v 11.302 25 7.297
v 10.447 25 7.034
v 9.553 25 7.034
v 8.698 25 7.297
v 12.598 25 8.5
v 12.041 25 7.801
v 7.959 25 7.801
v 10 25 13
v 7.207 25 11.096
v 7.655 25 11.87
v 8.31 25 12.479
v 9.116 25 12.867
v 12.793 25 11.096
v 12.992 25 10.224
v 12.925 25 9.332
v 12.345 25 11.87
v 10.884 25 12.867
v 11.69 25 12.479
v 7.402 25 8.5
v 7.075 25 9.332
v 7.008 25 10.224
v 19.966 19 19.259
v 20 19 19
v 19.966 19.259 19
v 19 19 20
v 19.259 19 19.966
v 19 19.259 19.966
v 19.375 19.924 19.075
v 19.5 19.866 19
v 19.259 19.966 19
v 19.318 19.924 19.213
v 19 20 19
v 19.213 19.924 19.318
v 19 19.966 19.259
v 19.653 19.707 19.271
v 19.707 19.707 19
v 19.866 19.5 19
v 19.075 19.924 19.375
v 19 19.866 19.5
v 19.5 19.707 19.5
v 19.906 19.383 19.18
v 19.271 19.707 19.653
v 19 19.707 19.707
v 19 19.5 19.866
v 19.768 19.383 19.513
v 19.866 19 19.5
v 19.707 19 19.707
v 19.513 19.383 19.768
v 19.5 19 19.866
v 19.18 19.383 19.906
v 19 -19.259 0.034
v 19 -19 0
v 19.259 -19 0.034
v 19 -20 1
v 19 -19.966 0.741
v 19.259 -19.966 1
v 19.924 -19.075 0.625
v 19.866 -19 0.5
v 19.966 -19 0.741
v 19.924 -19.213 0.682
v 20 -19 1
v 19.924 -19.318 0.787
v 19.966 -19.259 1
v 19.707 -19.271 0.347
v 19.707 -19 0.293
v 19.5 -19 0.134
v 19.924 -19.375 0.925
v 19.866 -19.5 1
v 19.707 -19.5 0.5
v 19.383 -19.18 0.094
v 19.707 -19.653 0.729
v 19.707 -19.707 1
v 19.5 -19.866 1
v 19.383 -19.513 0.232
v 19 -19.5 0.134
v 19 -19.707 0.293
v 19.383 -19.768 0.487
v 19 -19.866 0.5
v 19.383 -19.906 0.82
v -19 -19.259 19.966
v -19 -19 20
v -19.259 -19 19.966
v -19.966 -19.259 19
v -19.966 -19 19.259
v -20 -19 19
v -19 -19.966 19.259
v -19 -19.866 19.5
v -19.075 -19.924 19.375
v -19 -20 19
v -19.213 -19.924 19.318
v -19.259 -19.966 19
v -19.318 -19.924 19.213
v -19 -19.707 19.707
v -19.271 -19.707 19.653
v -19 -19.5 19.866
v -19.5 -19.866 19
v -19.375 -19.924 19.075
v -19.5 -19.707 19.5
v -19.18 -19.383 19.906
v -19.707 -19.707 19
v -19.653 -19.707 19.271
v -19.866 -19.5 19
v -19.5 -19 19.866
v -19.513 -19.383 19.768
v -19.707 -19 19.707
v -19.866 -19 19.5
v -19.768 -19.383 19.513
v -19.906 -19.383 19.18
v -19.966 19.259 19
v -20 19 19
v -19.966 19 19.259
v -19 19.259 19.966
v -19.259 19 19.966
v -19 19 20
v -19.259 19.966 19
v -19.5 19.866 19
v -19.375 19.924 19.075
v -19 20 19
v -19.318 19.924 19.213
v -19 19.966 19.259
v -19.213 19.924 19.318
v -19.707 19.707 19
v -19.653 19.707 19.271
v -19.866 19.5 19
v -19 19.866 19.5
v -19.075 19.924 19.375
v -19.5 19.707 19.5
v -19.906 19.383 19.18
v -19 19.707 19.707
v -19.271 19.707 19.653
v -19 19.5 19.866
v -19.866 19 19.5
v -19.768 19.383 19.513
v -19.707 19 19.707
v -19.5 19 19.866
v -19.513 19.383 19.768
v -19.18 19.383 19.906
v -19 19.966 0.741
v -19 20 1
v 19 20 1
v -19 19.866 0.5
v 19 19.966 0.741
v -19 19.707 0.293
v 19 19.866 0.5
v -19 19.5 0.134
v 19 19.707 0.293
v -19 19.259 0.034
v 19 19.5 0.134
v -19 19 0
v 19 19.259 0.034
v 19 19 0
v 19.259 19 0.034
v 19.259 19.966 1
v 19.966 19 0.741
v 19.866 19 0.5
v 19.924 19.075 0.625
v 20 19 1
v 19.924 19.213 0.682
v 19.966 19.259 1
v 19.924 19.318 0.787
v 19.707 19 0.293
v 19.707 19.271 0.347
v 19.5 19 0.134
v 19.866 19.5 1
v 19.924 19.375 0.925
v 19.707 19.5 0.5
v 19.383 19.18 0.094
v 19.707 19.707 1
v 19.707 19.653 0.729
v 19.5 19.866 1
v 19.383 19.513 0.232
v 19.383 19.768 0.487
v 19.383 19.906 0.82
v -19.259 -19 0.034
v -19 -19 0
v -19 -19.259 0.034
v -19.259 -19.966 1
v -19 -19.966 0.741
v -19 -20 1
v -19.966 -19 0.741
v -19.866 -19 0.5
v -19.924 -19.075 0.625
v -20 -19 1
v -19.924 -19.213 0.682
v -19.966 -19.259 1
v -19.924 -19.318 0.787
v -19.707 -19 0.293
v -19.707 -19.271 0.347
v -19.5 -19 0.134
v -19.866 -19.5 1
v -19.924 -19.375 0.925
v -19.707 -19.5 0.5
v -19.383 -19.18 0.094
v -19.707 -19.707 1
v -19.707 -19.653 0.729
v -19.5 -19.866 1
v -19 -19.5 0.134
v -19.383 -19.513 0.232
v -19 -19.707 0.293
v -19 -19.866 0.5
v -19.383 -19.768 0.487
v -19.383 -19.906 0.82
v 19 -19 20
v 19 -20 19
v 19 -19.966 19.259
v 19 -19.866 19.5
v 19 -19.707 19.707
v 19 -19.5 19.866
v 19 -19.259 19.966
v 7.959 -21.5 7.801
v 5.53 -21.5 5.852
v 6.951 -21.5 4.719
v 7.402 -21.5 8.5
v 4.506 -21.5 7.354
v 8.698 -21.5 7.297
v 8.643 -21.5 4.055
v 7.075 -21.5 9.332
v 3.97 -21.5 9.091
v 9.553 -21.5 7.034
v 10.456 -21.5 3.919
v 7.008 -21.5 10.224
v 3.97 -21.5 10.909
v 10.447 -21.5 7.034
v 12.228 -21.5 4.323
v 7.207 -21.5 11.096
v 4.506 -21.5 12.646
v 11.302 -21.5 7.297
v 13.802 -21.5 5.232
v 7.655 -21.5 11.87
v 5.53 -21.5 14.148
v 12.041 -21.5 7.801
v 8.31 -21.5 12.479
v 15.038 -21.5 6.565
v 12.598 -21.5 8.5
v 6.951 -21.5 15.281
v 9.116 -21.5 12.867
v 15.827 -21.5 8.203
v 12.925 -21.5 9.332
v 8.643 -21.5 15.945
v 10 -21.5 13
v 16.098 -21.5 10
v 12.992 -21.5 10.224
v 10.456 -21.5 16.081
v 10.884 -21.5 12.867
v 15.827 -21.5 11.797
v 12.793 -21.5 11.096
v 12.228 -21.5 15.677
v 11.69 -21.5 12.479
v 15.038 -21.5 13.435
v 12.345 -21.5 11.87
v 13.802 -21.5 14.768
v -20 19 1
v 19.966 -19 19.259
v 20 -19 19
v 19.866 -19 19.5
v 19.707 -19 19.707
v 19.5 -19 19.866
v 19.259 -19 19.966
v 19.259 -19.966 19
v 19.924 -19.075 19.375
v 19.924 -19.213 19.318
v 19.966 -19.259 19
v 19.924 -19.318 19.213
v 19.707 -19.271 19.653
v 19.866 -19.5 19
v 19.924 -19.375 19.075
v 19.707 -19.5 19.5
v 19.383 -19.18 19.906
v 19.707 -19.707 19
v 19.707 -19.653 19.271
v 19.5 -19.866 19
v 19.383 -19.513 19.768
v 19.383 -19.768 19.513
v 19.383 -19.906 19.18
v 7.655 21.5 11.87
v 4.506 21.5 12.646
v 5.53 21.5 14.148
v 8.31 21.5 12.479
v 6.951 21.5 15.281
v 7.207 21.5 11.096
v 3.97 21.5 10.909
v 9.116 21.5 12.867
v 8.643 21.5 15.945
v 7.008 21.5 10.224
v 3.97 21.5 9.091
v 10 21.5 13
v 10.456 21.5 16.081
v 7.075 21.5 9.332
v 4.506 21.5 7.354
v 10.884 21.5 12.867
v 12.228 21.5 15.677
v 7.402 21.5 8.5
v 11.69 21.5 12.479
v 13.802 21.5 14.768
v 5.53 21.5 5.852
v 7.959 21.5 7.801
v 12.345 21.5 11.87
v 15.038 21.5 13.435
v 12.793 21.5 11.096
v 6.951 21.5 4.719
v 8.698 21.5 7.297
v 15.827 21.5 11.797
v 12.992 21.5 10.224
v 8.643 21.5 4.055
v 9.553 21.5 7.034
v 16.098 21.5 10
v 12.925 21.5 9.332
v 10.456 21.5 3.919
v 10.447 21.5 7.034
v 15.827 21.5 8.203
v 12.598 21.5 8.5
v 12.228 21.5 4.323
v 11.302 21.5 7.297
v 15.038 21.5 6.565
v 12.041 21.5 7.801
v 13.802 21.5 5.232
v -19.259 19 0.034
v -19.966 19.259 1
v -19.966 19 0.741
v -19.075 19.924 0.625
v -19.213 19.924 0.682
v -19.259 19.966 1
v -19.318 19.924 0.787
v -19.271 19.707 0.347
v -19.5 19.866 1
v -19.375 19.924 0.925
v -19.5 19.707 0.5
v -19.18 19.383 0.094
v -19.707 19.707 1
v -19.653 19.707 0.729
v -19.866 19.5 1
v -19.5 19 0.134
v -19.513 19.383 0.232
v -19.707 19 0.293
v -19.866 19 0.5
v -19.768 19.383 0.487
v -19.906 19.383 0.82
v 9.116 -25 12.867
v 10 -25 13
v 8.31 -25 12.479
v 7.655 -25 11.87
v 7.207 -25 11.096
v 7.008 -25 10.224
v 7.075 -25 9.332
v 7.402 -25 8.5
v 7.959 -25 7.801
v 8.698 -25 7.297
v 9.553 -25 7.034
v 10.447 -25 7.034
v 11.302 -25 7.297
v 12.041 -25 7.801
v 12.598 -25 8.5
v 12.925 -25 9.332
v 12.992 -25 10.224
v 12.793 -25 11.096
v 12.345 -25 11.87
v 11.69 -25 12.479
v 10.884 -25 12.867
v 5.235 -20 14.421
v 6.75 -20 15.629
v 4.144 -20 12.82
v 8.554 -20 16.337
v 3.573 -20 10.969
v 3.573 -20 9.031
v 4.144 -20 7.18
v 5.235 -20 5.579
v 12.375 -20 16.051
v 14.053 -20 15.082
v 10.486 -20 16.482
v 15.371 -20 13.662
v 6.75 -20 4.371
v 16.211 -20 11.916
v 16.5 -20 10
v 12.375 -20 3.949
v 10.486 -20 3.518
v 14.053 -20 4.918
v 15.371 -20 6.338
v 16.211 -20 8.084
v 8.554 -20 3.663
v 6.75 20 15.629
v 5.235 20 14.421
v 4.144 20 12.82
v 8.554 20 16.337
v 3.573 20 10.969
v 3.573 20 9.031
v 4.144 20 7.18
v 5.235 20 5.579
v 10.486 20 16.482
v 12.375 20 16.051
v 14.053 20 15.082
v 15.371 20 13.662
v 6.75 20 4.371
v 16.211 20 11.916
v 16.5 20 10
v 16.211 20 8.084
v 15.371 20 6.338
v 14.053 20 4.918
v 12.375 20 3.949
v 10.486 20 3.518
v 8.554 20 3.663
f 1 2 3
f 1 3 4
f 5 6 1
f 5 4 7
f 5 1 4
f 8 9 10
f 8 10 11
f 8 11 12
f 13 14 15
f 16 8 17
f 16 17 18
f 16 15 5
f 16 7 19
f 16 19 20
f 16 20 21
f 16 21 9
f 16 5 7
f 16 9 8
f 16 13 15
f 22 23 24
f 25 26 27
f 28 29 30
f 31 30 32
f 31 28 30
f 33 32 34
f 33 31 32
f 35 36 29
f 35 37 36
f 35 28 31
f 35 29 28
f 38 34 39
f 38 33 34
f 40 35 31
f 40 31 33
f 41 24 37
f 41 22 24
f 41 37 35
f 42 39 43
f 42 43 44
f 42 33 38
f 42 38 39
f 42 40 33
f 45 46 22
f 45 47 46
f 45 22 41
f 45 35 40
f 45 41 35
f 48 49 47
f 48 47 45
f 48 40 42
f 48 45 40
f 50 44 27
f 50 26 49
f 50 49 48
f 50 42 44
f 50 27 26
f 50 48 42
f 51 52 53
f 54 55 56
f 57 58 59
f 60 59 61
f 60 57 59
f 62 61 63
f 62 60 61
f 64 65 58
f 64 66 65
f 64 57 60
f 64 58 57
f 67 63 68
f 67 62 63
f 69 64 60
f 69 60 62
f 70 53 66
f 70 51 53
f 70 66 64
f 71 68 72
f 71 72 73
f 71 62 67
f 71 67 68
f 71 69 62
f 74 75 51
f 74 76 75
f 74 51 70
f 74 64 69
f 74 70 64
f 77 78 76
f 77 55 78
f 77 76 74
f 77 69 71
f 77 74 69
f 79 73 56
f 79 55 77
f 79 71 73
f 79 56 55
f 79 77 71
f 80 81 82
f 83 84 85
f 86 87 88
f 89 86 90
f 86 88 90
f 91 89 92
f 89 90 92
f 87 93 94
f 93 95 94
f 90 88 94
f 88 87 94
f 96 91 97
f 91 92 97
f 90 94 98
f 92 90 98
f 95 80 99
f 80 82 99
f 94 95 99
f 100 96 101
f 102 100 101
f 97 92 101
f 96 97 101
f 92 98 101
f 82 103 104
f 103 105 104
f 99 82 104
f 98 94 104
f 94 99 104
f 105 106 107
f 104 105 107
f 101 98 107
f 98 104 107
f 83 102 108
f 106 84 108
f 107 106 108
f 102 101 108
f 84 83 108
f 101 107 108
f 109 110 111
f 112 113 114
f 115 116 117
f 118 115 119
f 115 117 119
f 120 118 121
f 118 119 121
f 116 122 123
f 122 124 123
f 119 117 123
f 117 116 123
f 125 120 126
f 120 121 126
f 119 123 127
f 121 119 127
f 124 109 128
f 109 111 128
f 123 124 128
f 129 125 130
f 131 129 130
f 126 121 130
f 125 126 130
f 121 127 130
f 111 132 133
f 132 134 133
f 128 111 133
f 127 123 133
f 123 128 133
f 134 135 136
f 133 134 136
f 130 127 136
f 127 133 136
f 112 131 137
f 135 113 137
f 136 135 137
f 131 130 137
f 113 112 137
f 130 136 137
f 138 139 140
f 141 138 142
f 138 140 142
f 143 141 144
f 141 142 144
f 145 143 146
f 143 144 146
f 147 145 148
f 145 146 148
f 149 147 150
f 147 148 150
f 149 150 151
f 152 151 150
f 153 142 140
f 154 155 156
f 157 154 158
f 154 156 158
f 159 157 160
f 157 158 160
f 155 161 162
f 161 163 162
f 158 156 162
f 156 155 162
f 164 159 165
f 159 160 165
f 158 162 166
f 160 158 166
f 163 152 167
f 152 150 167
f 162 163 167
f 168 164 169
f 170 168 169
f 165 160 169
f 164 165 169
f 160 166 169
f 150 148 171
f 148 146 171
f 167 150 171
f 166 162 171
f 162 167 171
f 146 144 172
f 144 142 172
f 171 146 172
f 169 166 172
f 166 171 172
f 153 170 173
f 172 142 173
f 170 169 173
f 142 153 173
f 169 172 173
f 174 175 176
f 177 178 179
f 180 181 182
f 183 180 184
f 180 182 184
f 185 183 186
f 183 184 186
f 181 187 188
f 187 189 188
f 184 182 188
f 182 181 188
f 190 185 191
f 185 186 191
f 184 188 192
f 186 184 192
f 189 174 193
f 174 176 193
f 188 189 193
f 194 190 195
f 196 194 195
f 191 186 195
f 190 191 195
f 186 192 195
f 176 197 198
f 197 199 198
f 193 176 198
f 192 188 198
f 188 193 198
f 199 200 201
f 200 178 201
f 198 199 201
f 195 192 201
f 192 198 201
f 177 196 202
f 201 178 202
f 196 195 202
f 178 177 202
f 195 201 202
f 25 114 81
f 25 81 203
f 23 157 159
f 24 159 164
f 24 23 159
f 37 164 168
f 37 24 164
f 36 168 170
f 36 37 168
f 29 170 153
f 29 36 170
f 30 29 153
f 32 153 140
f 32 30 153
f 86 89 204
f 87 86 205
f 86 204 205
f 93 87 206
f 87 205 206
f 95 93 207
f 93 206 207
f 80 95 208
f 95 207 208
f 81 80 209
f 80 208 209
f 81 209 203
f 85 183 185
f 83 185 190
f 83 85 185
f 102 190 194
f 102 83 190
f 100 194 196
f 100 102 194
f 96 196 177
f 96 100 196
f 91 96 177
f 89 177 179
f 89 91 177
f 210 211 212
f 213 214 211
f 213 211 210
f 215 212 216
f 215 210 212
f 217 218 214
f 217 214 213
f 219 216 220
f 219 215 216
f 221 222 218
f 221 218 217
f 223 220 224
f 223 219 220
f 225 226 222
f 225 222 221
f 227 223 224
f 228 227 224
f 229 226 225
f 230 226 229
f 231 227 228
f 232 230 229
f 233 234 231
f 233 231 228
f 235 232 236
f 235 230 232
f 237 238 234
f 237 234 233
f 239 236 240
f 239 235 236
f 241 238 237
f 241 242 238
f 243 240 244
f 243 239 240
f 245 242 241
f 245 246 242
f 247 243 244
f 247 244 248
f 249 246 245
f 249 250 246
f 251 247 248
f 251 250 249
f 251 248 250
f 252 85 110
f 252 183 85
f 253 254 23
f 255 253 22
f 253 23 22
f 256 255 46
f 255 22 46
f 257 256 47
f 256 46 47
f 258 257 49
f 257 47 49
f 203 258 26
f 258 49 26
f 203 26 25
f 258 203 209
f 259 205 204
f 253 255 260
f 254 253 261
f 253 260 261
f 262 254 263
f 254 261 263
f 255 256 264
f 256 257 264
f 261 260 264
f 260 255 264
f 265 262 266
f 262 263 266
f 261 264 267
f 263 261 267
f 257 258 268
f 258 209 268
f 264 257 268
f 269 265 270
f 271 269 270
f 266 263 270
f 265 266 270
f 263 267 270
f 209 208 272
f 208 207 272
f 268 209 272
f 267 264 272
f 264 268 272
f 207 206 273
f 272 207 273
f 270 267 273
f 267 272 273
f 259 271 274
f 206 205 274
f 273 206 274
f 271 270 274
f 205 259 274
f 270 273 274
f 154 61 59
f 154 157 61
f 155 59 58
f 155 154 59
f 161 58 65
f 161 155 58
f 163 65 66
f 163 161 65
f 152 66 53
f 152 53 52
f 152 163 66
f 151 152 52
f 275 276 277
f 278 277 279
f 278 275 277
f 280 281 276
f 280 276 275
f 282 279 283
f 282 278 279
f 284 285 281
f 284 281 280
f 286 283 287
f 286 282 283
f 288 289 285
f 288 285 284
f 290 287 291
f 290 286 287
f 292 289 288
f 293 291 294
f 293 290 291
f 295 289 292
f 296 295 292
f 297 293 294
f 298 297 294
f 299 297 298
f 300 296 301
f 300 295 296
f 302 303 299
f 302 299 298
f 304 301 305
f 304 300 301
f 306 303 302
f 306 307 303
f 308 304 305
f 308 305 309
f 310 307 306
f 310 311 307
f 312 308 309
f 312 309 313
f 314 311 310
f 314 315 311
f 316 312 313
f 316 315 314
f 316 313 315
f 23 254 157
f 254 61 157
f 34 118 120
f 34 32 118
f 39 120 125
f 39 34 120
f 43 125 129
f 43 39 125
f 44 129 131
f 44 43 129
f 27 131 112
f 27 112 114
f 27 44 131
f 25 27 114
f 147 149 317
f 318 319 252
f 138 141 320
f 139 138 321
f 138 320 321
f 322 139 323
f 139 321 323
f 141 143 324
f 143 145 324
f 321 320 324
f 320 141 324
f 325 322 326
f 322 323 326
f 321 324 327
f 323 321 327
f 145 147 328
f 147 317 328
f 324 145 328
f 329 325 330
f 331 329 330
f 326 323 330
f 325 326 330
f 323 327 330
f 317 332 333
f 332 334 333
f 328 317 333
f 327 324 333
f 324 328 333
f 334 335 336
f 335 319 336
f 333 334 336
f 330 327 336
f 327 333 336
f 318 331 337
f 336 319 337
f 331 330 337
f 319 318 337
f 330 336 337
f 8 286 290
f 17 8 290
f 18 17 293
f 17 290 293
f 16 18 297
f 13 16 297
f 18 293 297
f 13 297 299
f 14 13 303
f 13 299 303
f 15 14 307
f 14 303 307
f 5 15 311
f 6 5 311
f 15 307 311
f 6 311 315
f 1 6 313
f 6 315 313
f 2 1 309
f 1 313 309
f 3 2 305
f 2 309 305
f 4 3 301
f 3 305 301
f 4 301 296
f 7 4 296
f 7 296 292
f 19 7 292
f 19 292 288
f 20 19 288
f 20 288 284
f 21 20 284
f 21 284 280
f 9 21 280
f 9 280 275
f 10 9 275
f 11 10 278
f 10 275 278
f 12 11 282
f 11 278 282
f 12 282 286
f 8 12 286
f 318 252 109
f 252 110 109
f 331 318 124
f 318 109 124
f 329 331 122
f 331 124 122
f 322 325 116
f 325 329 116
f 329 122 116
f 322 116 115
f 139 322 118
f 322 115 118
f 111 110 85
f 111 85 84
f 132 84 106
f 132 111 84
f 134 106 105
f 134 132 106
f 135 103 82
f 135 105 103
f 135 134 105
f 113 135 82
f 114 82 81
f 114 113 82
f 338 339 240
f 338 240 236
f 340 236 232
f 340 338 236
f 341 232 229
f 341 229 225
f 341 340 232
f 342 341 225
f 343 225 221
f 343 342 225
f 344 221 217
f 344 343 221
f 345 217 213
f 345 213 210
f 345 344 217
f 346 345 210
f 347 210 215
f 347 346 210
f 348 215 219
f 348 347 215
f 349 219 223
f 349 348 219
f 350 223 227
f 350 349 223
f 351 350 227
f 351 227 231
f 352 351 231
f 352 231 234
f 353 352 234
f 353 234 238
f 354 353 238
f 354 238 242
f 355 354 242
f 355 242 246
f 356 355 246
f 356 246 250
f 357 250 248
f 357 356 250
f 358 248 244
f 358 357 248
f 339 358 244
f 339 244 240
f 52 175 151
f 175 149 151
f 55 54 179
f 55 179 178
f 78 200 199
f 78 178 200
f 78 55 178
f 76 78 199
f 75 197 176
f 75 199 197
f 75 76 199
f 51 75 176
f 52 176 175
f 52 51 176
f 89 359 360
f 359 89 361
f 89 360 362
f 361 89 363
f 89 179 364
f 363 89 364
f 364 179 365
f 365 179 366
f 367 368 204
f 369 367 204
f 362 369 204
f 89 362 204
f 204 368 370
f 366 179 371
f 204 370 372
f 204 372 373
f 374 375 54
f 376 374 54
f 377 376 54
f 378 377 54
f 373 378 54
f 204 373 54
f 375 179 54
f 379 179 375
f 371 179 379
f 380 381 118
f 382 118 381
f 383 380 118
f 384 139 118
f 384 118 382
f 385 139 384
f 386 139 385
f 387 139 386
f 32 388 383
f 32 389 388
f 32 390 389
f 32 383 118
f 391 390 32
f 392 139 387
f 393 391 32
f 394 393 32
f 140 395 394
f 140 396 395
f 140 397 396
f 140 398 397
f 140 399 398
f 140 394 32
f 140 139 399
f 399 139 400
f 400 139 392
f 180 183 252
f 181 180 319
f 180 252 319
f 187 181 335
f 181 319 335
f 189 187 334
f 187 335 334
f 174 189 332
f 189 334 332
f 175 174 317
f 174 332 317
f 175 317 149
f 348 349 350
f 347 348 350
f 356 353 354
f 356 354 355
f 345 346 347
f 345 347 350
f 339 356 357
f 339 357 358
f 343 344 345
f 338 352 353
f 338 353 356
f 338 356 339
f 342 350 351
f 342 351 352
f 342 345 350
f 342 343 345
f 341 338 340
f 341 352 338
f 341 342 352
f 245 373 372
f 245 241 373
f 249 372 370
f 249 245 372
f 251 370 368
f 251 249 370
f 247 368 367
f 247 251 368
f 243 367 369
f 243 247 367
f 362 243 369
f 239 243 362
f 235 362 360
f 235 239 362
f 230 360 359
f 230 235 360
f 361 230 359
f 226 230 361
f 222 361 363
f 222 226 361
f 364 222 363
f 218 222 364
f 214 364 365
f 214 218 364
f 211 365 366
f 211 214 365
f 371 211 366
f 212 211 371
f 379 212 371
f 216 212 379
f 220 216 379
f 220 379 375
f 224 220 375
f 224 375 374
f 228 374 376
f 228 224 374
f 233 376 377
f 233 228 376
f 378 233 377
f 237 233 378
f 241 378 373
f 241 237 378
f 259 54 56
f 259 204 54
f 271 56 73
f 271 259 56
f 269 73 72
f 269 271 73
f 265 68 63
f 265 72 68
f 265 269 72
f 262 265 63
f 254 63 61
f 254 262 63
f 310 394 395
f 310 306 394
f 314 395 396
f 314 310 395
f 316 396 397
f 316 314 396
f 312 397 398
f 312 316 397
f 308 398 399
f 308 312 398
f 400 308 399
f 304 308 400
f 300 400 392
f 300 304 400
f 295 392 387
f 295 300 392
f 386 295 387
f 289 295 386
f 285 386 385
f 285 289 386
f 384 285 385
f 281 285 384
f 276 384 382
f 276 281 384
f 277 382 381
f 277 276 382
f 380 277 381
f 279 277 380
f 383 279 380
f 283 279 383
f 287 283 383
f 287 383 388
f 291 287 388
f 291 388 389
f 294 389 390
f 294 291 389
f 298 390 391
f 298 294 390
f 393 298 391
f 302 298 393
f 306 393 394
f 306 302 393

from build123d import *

# Parameters (mm, degrees)
SKETCH_1_W      = 40
SKETCH_1_H      = 40
EXTRUDE_1_DEPTH = 20
FILLET_1_R      = 1
SKETCH_2_R      = 6.5
EXTRUDE_2_DEPTH = 1.5
EXTRUDE_2_TAPER = 15
SKETCH_3_R      = 3
EXTRUDE_3_DEPTH = 3.5
SKETCH_4_R      = 6.5
EXTRUDE_4_DEPTH = 1.5
EXTRUDE_4_TAPER = 15
EXTRUDE_START   = 3.5
SKETCH_5_R      = 3
EXTRUDE_5_DEPTH = 3.5


with BuildPart() as part:
    # 草图1 → 凸台-拉伸1 (new body)
    with BuildSketch(Plane.XY):
        Rectangle(SKETCH_1_W, SKETCH_1_H)
    extrude(amount=EXTRUDE_1_DEPTH)

    # 圆角1
    fillet_1_edges = [part.edges().sort_by_distance(p)[0] for p in [
        (-20, 0, 20),
        (0, -20, 20),
        (20, 0, 20),
        (0, -20, 0),
        (-20, 0, 0),
        (0, 20, 0),
        (20, 0, 0),
        (20, -20, 10),
        (-20, -20, 10),
        (-20, 20, 10),
        (20, 20, 10),
        (0, 20, 20),
    ]]
    fillet(fillet_1_edges, radius=FILLET_1_R)

    # 草图2 → 凸台-拉伸2 (add)
    with BuildSketch(Plane(origin=(0, 20, 0), x_dir=(1, 0, 0), z_dir=(0, 1, 0))):
        with Locations((10, -10)):
            Circle(SKETCH_2_R)
    extrude(amount=EXTRUDE_2_DEPTH, taper=EXTRUDE_2_TAPER)

    # 草图3 → 凸台-拉伸3 (add)
    with BuildSketch(Plane(origin=(0, 21.5, 0), x_dir=(1, 0, 0), z_dir=(0, 1, 0))):
        with Locations(Location((10, -10, 0), (0, 0, 270))):
            Circle(SKETCH_3_R)
    extrude(amount=EXTRUDE_3_DEPTH)

    # 草图4 → 凸台-拉伸4 (add)
    with BuildSketch(Plane.XZ.offset(20)):
        with Locations((10, 10)):
            Circle(SKETCH_4_R)
    extrude(amount=EXTRUDE_4_DEPTH, taper=EXTRUDE_4_TAPER)

    # 草图5 → 凸台-拉伸5 (add)
    with BuildSketch(Plane.XZ.offset(21.5).offset(EXTRUDE_START)):
        with Locations(Location((10, 10, 0), (0, 0, 90))):
            Circle(SKETCH_5_R)
    extrude(amount=-EXTRUDE_5_DEPTH)


solid = part.part
